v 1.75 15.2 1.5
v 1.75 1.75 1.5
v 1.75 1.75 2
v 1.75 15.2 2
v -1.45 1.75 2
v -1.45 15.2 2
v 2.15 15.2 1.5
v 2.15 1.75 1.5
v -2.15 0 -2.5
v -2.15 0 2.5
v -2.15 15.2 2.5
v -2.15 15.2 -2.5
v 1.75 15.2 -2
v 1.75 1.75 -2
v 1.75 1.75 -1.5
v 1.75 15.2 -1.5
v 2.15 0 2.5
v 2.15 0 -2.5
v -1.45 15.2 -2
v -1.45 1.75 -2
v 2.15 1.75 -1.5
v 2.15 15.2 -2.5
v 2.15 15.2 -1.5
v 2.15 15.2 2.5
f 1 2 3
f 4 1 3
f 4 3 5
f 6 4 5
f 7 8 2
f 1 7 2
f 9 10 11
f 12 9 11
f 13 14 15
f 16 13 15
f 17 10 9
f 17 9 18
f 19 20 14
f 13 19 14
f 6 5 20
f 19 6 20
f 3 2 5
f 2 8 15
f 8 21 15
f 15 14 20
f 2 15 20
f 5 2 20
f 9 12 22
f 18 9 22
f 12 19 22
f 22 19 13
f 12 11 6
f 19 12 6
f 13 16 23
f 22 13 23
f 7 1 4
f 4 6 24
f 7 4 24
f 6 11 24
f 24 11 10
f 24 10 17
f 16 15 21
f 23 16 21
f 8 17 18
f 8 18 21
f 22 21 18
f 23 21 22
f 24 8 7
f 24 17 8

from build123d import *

# Parameters (mm, degrees)
SKETCH1_W           = 4.3
SKETCH1_H           = 15.2
BOSS_EXTRUDE1_DEPTH = 2.5
CUT_EXTRUDE1_START  = -1.75
CUT_EXTRUDE1_DEPTH  = 14.45


with BuildPart() as part:
    # Sketch1 → Boss-Extrude1 (new body, symmetric)
    with BuildSketch(Plane.XY):
        with Locations((0, 7.6)):
            Rectangle(SKETCH1_W, SKETCH1_H)
    extrude(amount=BOSS_EXTRUDE1_DEPTH, both=True)

    # Sketch3 → Cut-Extrude1 (cut, through all)
    with BuildSketch(Plane(origin=(0, 0, 0), x_dir=(-1, 0, 0), z_dir=(0, -1, 0)).offset(CUT_EXTRUDE1_START)):
        Polygon((-2.15, -1.5), (-1.75, -1.5), (-1.75, -2), (1.45, -2), (1.45, 2), (-1.75, 2), (-1.75, 1.5), (-2.15, 1.5), align=None)
    extrude(amount=-CUT_EXTRUDE1_DEPTH, mode=Mode.SUBTRACT)


solid = part.part
